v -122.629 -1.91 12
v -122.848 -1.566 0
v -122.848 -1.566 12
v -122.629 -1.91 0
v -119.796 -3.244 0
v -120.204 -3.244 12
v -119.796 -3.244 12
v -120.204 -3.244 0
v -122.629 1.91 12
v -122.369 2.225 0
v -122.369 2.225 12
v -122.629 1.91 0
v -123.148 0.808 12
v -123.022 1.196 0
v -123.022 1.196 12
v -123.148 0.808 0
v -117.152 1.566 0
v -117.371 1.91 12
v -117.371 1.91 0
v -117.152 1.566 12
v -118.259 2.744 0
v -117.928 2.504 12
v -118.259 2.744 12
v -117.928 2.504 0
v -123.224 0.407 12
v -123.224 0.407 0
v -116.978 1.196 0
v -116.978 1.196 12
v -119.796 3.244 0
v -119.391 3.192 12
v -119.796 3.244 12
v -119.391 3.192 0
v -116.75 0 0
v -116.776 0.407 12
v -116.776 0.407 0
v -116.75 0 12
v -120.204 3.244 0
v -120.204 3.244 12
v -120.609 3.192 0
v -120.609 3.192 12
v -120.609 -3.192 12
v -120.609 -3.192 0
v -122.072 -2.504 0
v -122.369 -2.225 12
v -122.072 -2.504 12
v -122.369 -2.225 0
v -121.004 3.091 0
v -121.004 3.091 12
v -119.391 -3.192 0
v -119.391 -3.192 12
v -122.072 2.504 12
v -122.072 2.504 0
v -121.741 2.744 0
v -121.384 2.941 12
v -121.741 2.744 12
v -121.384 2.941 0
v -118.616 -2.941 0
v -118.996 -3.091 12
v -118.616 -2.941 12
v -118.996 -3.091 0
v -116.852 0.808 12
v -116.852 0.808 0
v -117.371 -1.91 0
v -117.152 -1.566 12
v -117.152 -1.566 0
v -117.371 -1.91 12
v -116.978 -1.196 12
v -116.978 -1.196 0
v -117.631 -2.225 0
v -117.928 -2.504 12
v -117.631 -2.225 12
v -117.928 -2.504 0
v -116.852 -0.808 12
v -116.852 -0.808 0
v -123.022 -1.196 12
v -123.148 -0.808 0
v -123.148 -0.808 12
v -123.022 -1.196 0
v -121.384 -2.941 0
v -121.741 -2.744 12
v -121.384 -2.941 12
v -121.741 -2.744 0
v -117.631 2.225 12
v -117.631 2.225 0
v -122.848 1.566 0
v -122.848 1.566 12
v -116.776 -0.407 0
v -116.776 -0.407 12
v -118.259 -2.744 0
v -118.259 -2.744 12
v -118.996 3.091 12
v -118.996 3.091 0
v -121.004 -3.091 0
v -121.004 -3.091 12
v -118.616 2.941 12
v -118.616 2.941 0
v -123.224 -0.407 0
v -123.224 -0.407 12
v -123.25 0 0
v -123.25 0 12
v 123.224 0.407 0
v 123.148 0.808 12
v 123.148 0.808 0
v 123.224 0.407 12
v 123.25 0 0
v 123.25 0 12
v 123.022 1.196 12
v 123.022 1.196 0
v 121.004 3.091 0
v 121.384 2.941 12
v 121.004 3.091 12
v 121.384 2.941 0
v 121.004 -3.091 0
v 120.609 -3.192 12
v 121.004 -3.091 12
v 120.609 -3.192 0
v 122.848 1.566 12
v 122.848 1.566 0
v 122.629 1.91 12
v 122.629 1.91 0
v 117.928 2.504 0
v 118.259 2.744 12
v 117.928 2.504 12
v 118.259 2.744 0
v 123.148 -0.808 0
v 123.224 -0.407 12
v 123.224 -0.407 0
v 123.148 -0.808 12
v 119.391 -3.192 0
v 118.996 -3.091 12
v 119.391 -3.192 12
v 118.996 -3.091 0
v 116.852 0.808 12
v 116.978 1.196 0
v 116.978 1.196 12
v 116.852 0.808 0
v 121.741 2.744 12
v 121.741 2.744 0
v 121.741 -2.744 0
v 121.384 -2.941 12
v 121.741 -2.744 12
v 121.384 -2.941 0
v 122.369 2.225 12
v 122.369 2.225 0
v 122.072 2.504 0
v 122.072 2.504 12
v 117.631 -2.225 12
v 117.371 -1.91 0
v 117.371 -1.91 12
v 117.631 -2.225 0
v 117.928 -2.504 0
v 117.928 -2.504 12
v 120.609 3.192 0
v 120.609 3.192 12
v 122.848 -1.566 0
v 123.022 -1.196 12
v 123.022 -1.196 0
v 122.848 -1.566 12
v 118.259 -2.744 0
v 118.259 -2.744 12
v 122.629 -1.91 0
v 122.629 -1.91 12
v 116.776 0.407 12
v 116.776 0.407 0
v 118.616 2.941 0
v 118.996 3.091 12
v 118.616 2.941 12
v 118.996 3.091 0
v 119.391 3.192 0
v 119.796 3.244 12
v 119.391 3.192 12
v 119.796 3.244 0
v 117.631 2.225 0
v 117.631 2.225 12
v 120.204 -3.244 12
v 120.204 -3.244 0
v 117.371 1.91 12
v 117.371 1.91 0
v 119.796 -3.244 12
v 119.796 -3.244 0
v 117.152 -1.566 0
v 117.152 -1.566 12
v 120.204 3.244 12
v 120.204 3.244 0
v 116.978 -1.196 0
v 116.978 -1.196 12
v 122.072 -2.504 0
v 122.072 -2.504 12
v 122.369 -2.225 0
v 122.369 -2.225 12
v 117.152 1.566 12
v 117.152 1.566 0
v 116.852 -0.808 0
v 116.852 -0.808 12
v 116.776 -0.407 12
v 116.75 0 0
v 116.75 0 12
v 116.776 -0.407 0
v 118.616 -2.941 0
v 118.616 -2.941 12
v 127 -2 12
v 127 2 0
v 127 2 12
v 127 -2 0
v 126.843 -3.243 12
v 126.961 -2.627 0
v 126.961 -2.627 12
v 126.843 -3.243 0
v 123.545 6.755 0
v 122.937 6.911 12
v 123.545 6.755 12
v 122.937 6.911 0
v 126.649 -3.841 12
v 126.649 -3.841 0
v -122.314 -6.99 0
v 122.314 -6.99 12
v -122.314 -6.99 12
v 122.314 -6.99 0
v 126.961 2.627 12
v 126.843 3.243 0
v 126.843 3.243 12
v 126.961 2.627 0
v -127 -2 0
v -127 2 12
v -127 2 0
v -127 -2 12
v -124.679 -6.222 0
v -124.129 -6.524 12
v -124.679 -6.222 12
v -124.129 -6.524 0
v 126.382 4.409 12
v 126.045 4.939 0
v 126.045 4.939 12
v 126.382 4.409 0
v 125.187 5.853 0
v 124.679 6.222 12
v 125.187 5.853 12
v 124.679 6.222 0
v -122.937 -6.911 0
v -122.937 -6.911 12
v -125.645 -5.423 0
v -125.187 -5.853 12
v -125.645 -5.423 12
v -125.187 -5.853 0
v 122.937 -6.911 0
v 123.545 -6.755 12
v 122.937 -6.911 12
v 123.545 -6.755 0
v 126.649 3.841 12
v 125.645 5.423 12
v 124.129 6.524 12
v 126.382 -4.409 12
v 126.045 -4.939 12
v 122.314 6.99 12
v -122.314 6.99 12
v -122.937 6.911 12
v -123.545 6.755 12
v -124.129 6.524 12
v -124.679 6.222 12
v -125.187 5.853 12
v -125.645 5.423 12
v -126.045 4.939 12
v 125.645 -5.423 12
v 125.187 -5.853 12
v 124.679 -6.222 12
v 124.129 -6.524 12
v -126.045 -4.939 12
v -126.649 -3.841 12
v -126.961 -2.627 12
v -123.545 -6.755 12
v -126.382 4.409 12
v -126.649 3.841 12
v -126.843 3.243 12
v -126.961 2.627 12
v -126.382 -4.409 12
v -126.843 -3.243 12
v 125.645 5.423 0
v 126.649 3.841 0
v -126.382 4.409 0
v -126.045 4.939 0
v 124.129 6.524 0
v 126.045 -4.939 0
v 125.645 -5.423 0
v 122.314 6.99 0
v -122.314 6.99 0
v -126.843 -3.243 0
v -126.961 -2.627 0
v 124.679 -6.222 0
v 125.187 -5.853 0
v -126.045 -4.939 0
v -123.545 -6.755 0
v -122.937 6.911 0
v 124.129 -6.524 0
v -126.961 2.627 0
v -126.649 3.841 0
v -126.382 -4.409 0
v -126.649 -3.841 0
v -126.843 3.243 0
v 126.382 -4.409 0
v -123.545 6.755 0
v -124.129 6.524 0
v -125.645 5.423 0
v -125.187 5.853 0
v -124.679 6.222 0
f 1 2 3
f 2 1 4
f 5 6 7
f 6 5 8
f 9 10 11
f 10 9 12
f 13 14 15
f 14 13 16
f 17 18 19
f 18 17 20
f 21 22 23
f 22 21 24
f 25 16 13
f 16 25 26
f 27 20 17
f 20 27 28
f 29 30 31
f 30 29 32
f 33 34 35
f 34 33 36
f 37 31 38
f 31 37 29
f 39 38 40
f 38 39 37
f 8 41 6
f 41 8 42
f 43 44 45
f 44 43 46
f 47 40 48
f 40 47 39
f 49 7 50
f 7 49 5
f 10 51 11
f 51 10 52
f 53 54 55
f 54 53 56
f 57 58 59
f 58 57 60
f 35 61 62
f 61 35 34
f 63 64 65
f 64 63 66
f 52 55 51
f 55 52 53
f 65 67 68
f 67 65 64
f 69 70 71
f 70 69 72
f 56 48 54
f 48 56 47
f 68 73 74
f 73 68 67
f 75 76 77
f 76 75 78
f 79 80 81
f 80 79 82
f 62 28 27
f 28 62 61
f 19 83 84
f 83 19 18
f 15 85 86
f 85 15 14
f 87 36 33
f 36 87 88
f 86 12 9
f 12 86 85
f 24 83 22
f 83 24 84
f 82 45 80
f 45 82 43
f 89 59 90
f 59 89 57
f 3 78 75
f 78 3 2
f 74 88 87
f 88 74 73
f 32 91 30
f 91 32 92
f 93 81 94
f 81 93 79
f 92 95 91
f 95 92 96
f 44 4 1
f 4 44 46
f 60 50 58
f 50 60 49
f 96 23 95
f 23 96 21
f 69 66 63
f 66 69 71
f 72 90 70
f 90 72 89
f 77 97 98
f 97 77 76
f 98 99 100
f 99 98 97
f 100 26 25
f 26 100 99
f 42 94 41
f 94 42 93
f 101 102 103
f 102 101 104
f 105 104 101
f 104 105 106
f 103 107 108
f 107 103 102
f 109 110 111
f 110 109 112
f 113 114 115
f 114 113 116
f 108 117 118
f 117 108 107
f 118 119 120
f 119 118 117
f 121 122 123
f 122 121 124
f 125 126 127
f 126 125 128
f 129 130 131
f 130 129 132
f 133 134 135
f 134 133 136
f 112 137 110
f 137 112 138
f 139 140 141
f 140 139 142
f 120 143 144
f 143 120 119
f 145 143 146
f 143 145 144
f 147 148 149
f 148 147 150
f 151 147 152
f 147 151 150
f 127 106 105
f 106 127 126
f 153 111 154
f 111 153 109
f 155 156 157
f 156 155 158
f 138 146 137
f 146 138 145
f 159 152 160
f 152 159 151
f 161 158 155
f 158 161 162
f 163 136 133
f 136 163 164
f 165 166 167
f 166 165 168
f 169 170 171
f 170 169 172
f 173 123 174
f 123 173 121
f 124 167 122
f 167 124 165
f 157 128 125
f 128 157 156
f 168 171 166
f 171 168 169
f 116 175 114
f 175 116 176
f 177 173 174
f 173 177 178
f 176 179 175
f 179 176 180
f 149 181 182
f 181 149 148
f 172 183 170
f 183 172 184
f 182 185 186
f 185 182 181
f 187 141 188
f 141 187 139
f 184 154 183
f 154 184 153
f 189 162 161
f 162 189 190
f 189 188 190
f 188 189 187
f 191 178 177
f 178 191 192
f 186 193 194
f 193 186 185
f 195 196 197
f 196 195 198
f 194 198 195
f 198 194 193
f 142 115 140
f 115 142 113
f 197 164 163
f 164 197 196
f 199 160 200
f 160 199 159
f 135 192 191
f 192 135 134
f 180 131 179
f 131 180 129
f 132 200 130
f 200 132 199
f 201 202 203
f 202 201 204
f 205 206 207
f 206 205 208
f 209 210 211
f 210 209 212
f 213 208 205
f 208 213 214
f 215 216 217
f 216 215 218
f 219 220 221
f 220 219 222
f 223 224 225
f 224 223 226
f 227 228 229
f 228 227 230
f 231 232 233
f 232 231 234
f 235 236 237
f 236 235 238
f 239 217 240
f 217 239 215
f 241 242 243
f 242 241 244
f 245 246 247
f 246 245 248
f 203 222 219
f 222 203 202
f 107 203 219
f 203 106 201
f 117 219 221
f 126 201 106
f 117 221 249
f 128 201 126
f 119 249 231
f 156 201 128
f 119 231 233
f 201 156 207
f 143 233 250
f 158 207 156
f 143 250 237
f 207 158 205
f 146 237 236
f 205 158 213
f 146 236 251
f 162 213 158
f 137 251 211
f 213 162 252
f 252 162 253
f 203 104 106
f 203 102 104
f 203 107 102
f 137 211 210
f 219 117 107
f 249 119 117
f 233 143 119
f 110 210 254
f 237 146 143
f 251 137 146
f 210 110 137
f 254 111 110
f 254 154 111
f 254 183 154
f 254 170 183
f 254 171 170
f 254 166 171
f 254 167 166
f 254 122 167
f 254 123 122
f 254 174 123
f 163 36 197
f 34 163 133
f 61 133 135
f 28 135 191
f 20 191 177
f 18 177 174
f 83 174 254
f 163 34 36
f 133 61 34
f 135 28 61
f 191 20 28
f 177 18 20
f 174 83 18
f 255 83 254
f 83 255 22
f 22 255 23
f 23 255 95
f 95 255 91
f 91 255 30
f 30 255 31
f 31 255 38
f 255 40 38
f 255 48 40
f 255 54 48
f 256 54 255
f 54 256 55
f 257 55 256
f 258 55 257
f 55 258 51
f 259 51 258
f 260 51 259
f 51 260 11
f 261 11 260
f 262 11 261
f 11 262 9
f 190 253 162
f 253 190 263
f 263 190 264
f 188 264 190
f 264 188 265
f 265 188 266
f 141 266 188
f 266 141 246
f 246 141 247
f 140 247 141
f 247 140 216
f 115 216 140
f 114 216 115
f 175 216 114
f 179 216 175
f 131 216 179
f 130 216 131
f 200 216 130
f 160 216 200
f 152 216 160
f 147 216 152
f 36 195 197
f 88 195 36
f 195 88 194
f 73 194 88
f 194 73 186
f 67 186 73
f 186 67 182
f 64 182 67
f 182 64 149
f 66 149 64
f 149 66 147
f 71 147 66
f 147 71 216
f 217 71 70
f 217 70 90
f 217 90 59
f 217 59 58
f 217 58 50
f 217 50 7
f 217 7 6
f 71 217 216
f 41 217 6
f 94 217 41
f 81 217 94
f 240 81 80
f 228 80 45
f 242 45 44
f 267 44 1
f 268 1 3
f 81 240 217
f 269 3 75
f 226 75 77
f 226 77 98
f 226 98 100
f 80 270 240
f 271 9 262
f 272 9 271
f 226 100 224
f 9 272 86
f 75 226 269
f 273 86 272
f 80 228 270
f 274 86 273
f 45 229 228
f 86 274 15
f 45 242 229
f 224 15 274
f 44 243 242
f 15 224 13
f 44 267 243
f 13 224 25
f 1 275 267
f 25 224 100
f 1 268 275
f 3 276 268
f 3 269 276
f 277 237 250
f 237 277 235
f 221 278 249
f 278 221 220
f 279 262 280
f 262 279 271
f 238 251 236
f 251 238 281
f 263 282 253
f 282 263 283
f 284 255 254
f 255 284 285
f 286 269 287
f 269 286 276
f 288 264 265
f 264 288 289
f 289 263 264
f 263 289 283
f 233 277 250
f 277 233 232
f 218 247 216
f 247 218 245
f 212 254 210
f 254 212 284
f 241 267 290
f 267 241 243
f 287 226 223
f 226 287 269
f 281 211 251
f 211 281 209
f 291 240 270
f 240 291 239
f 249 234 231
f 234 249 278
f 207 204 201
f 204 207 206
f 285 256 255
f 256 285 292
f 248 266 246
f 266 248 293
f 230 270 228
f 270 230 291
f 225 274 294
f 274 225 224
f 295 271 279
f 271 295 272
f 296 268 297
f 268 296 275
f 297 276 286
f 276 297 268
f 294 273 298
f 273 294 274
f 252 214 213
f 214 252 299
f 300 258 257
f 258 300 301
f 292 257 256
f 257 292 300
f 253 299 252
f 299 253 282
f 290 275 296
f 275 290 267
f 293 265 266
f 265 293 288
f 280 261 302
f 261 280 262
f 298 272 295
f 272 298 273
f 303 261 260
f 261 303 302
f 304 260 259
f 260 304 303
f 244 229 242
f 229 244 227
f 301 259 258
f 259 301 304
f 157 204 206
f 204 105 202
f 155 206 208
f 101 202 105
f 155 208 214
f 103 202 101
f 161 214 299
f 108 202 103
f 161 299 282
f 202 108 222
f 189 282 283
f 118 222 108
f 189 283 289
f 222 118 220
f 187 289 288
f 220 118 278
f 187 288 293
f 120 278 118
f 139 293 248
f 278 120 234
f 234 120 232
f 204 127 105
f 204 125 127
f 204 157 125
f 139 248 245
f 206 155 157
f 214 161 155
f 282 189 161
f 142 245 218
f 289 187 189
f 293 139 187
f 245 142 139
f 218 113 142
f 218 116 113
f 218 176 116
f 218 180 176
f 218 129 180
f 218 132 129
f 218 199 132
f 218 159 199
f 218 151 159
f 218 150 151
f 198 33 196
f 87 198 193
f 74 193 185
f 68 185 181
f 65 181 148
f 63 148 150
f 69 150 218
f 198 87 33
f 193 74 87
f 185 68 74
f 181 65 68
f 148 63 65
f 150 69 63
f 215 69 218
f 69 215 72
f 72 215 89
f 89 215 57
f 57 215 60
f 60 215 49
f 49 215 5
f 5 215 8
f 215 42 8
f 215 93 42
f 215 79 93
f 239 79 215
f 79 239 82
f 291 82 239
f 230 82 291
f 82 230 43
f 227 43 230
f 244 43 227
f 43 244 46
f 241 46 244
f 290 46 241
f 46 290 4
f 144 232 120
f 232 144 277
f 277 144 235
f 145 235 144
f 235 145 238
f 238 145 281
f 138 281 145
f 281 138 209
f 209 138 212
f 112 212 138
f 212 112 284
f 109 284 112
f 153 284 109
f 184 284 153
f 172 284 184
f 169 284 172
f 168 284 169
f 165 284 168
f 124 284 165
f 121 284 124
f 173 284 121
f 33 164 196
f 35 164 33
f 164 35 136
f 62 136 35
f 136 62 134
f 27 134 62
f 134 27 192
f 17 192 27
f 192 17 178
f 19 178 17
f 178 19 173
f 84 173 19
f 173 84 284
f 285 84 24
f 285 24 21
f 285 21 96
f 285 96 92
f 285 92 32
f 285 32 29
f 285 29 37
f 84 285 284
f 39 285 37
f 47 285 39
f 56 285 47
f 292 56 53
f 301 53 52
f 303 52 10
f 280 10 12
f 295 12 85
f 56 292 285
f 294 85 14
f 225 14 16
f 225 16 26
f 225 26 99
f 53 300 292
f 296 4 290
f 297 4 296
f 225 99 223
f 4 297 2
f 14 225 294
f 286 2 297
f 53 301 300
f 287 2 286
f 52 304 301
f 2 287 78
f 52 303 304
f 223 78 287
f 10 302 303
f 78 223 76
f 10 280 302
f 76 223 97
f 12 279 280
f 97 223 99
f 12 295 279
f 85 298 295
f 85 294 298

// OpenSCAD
$fn = 50;


difference() {
	union() {
		hull() {
			translate(v = [-122.0000000000, 2.0000000000, 0]) {
				cylinder(h = 12, r = 5);
			}
			translate(v = [122.0000000000, 2.0000000000, 0]) {
				cylinder(h = 12, r = 5);
			}
			translate(v = [-122.0000000000, -2.0000000000, 0]) {
				cylinder(h = 12, r = 5);
			}
			translate(v = [122.0000000000, -2.0000000000, 0]) {
				cylinder(h = 12, r = 5);
			}
		}
	}
	union() {
		translate(v = [-120.0000000000, 0.0000000000, -100.0000000000]) {
			cylinder(h = 200, r = 3.2500000000);
		}
		translate(v = [-120.0000000000, 0.0000000000, -100.0000000000]) {
			cylinder(h = 200, r = 3.2500000000);
		}
		translate(v = [120.0000000000, 0.0000000000, -100.0000000000]) {
			cylinder(h = 200, r = 3.2500000000);
		}
		translate(v = [120.0000000000, 0.0000000000, -100.0000000000]) {
			cylinder(h = 200, r = 3.2500000000);
		}
	}
}
